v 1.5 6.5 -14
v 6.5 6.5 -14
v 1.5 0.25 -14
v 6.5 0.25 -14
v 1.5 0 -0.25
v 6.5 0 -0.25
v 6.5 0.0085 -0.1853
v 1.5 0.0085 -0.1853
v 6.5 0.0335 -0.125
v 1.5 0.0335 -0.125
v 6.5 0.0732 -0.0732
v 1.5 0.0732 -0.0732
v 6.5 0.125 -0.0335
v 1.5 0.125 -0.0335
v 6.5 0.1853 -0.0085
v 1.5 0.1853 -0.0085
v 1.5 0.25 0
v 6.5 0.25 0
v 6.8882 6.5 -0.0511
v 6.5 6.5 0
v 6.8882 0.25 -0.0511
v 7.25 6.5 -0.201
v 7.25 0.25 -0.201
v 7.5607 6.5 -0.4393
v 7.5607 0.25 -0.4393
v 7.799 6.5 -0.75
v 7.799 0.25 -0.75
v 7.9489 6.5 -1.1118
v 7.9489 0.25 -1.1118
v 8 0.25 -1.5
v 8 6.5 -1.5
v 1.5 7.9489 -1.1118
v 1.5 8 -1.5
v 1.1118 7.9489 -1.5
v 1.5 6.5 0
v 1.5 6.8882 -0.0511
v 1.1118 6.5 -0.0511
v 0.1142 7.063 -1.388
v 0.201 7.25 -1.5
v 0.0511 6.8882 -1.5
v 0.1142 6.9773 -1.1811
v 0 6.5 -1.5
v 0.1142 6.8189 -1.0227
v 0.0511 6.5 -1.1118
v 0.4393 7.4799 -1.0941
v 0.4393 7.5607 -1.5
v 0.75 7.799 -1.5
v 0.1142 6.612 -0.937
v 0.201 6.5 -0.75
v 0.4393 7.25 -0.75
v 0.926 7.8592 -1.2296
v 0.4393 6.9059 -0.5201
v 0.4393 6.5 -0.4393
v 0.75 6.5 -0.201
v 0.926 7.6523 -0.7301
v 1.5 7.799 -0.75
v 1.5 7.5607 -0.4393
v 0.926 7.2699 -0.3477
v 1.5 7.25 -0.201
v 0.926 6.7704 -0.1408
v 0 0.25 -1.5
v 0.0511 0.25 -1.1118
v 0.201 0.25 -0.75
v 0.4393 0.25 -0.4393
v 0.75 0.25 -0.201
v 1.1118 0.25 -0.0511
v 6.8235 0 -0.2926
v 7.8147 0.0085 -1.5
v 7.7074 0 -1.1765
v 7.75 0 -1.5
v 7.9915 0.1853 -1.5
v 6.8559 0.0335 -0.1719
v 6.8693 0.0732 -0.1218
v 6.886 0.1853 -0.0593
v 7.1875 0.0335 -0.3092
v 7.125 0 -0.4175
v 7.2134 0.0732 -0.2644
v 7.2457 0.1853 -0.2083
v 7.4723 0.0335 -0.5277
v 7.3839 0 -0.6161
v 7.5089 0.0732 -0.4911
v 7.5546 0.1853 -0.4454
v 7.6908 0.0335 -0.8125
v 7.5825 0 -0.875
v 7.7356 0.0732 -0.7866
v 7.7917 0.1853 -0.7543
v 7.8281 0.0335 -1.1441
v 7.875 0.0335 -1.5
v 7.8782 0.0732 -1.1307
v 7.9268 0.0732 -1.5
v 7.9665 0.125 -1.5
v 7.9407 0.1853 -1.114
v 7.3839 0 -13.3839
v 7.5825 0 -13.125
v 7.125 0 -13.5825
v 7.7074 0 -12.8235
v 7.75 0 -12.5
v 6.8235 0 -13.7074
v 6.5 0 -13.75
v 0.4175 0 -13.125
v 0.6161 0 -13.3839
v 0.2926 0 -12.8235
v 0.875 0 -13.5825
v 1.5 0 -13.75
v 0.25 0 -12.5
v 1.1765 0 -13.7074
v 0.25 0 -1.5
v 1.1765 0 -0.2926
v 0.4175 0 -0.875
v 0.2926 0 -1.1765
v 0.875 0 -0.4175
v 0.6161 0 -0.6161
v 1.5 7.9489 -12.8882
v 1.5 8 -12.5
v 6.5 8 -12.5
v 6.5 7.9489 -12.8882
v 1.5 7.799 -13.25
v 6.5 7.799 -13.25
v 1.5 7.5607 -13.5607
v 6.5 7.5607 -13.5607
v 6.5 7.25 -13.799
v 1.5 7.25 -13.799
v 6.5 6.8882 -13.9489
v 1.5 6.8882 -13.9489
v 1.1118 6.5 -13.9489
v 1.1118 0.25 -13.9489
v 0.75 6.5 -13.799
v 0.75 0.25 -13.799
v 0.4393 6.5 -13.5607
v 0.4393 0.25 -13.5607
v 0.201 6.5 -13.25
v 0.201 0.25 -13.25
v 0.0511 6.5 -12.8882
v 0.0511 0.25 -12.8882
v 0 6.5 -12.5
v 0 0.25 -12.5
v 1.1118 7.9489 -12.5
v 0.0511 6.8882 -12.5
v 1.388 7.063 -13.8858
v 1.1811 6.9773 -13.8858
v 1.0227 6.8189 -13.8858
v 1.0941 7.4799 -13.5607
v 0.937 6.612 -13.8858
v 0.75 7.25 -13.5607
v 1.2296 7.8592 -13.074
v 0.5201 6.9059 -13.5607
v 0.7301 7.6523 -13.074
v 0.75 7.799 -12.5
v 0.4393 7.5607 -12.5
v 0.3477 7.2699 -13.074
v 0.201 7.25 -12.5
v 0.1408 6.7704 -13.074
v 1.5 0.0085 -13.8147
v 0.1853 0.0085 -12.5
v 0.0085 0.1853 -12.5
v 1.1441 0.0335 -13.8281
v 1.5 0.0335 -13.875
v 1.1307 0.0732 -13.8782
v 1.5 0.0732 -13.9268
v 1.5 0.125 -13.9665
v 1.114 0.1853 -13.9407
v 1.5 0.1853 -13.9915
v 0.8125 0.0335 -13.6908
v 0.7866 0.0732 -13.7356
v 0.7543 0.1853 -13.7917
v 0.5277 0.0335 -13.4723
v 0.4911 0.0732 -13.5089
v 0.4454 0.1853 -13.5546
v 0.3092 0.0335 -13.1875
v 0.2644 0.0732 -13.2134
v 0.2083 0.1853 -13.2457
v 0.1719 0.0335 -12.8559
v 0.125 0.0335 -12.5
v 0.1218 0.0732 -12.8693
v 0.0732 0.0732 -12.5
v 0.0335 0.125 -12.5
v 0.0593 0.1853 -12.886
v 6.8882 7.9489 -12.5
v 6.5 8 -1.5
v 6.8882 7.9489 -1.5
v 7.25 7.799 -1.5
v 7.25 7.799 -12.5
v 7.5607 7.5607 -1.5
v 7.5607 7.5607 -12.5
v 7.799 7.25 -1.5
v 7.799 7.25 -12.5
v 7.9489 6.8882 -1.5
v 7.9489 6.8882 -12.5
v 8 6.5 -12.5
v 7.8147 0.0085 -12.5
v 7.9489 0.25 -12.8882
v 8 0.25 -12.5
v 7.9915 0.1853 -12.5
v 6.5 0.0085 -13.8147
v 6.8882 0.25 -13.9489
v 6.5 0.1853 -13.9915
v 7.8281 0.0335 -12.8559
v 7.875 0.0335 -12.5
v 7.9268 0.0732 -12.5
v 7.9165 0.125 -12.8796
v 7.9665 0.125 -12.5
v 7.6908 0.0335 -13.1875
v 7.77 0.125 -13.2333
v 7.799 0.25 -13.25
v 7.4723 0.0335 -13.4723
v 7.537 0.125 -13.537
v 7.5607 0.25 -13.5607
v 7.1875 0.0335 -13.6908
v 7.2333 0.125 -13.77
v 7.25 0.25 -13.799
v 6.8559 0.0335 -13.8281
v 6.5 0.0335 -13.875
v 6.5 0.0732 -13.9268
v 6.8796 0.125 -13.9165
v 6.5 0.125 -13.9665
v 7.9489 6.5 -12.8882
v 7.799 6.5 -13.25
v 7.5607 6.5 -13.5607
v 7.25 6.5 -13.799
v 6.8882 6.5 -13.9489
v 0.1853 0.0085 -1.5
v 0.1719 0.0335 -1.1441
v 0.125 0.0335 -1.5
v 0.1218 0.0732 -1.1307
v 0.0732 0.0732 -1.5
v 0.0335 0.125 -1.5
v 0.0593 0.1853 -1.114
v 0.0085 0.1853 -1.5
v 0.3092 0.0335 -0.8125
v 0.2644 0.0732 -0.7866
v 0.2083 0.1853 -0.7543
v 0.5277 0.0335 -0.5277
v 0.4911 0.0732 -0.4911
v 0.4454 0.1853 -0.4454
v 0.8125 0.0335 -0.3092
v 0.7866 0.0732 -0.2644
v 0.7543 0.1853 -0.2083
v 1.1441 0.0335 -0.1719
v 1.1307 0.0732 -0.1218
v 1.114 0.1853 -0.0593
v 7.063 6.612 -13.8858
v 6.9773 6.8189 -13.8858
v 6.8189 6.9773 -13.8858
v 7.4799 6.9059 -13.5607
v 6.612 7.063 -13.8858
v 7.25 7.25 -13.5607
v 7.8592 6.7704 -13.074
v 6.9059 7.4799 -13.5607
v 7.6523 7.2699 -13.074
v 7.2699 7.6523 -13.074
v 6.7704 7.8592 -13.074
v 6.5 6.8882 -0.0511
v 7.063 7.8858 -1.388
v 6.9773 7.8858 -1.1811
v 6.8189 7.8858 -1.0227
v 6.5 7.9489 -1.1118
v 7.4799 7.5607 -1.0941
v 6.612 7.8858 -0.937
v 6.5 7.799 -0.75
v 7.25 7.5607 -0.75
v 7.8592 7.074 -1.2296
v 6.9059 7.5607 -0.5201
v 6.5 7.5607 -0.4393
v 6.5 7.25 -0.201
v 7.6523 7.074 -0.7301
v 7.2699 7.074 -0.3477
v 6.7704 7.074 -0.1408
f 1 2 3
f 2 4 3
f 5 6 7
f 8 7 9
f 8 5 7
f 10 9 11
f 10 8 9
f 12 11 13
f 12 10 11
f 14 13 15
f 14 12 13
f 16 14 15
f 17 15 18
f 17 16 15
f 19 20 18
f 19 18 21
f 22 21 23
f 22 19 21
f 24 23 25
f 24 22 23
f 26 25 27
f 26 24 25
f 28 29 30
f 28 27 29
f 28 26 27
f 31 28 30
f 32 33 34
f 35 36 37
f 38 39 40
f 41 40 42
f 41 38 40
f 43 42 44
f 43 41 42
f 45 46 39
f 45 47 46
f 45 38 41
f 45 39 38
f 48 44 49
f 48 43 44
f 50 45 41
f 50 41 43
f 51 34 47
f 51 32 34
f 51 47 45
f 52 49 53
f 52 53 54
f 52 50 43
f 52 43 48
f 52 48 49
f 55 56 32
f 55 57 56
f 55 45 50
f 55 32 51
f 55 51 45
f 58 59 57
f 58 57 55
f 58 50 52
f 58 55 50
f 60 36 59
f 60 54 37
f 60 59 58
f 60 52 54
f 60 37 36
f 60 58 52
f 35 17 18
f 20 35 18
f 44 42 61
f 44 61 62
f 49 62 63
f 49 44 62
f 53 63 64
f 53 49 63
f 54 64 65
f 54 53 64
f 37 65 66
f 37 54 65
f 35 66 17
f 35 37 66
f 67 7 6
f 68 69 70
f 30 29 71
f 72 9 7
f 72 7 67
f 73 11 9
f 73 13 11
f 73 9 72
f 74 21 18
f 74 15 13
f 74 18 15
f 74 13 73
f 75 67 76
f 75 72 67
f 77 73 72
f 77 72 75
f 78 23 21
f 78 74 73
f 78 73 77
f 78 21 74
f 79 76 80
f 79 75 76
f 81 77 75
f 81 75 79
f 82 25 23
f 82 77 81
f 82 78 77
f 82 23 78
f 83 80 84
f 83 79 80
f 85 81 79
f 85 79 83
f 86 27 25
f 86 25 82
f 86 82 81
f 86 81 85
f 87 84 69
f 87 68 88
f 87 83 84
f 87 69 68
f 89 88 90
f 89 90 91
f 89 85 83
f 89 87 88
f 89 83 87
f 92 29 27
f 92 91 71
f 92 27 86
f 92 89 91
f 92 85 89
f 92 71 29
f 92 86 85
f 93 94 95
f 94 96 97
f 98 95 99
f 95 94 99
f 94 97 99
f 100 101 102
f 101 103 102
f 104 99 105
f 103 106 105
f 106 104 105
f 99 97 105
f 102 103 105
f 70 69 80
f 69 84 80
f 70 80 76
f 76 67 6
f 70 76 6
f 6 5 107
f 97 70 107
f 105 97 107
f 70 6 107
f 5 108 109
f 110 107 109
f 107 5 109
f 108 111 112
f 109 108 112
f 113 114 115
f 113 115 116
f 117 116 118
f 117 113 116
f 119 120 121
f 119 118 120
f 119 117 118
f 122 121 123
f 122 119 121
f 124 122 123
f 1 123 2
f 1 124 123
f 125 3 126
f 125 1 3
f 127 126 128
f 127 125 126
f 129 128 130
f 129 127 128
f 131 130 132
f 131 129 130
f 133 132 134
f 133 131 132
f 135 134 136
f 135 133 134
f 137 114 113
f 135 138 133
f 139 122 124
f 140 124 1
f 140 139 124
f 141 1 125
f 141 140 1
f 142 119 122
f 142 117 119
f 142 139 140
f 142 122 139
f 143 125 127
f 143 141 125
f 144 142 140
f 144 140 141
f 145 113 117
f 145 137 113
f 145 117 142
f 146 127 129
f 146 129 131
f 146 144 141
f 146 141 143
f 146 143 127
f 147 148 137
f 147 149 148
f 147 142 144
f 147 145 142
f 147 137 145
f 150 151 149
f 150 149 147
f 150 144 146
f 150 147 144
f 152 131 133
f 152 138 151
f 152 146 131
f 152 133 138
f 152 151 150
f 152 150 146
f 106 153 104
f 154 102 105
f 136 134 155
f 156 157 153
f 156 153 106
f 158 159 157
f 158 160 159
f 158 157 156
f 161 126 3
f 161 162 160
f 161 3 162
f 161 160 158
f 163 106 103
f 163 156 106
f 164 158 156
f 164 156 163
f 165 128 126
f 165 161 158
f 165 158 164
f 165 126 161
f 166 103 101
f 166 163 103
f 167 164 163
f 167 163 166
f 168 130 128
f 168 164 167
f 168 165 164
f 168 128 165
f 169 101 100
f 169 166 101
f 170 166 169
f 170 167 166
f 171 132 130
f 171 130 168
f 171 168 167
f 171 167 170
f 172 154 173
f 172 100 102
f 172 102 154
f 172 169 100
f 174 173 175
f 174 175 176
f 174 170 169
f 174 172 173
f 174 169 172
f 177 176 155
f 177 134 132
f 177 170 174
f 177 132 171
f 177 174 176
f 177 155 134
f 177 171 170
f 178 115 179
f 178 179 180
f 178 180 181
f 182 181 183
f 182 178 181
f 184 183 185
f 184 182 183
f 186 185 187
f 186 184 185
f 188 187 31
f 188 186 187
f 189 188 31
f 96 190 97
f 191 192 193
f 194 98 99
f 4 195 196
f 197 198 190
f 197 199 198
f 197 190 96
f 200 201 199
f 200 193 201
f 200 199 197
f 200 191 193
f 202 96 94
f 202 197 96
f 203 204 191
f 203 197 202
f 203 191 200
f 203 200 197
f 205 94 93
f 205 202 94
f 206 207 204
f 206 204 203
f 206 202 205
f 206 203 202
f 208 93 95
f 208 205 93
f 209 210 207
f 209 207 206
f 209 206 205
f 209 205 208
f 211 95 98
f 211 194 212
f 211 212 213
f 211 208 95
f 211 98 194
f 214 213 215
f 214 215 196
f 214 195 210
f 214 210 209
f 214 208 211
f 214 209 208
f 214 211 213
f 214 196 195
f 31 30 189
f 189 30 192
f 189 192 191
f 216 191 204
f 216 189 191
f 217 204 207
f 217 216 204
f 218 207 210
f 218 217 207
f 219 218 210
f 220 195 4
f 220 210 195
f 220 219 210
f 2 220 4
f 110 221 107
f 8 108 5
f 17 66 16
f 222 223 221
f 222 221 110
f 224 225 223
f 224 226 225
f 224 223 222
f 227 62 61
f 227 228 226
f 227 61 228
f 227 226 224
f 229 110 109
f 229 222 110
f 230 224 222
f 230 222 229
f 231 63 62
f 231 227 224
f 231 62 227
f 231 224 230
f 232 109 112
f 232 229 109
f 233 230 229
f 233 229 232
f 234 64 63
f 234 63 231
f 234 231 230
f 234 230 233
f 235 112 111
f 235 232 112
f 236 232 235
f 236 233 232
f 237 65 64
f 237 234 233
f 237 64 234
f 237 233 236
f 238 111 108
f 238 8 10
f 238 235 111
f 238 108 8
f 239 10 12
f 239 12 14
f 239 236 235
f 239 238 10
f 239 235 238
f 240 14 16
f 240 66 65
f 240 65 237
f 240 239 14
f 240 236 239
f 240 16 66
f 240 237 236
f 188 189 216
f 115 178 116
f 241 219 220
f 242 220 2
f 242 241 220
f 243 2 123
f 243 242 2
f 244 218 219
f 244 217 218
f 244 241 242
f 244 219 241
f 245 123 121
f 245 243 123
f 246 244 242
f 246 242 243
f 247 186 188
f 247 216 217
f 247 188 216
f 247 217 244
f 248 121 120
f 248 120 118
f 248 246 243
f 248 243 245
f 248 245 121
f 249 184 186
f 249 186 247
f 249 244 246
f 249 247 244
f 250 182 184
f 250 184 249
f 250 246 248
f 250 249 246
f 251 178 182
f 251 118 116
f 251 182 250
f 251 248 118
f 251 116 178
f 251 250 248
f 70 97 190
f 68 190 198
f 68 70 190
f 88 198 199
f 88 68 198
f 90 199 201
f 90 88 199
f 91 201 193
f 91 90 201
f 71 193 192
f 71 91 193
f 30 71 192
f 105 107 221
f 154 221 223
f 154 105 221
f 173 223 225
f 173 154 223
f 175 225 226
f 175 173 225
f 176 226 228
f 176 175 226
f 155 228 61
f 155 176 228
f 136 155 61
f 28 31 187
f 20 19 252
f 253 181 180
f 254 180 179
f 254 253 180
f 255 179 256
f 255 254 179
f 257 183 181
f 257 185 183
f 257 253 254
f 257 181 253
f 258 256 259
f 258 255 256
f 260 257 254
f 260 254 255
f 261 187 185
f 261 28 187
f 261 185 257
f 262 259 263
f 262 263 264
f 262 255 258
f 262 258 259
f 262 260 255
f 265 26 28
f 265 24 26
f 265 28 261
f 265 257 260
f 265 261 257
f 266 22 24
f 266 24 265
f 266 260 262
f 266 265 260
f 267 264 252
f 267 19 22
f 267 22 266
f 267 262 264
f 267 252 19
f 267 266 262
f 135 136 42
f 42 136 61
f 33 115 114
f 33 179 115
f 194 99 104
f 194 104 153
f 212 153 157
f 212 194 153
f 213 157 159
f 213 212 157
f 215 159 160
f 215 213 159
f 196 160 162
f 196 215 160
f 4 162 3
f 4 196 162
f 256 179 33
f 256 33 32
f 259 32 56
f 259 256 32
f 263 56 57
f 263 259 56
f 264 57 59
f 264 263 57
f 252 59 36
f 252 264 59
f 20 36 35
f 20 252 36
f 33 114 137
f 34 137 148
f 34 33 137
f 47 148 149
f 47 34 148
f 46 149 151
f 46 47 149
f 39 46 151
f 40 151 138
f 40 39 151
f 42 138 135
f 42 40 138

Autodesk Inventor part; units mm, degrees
ref_plane "YZ Plane" through (0, 0, 0) normal (1, 0, 0) x (0, 1, 0)
ref_plane "XZ Plane" through (0, 0, 0) normal (0, 1, 0) x (-1, 0, 0)
ref_plane "XY Plane" through (0, 0, 0) normal (0, 0, 1) x (1, 0, 0)
sketch "Sketch1" plane through (0, 0, 0) normal (0, 1, 0) x (-1, 0, 0)
  line L0 (0, 0) -> (-8, 0)
  line L1 (-8, 0) -> (-8, -14)
  line L2 (-8, -14) -> (0, -14)
  line L3 (0, -14) -> (0, 0)
  dimension "d0" = 8
  dimension "d1" = 14
extrude "Extrusion1" add sketch "Sketch1" along normal blind 8
fillet "Fillet1" radius 1.5 8 edges at (8, 4, 0) (8, 8, -7) (4, 8, 0) (0, 8, -7) (0, 4, 0) (8, 4, -14) (4, 8, -14) (0, 4, -14)
fillet "Fillet2" radius 0.25 8 edges at (7.5607, 0, -13.5607) (4, 0, -14) (0.4393, 0, -13.5607) (0, 0, -7) (0.4393, 0, -0.4393) (4, 0, 0) (7.5607, 0, -0.4393) (8, 0, -7)
properties part number "Button_SelectButton"
